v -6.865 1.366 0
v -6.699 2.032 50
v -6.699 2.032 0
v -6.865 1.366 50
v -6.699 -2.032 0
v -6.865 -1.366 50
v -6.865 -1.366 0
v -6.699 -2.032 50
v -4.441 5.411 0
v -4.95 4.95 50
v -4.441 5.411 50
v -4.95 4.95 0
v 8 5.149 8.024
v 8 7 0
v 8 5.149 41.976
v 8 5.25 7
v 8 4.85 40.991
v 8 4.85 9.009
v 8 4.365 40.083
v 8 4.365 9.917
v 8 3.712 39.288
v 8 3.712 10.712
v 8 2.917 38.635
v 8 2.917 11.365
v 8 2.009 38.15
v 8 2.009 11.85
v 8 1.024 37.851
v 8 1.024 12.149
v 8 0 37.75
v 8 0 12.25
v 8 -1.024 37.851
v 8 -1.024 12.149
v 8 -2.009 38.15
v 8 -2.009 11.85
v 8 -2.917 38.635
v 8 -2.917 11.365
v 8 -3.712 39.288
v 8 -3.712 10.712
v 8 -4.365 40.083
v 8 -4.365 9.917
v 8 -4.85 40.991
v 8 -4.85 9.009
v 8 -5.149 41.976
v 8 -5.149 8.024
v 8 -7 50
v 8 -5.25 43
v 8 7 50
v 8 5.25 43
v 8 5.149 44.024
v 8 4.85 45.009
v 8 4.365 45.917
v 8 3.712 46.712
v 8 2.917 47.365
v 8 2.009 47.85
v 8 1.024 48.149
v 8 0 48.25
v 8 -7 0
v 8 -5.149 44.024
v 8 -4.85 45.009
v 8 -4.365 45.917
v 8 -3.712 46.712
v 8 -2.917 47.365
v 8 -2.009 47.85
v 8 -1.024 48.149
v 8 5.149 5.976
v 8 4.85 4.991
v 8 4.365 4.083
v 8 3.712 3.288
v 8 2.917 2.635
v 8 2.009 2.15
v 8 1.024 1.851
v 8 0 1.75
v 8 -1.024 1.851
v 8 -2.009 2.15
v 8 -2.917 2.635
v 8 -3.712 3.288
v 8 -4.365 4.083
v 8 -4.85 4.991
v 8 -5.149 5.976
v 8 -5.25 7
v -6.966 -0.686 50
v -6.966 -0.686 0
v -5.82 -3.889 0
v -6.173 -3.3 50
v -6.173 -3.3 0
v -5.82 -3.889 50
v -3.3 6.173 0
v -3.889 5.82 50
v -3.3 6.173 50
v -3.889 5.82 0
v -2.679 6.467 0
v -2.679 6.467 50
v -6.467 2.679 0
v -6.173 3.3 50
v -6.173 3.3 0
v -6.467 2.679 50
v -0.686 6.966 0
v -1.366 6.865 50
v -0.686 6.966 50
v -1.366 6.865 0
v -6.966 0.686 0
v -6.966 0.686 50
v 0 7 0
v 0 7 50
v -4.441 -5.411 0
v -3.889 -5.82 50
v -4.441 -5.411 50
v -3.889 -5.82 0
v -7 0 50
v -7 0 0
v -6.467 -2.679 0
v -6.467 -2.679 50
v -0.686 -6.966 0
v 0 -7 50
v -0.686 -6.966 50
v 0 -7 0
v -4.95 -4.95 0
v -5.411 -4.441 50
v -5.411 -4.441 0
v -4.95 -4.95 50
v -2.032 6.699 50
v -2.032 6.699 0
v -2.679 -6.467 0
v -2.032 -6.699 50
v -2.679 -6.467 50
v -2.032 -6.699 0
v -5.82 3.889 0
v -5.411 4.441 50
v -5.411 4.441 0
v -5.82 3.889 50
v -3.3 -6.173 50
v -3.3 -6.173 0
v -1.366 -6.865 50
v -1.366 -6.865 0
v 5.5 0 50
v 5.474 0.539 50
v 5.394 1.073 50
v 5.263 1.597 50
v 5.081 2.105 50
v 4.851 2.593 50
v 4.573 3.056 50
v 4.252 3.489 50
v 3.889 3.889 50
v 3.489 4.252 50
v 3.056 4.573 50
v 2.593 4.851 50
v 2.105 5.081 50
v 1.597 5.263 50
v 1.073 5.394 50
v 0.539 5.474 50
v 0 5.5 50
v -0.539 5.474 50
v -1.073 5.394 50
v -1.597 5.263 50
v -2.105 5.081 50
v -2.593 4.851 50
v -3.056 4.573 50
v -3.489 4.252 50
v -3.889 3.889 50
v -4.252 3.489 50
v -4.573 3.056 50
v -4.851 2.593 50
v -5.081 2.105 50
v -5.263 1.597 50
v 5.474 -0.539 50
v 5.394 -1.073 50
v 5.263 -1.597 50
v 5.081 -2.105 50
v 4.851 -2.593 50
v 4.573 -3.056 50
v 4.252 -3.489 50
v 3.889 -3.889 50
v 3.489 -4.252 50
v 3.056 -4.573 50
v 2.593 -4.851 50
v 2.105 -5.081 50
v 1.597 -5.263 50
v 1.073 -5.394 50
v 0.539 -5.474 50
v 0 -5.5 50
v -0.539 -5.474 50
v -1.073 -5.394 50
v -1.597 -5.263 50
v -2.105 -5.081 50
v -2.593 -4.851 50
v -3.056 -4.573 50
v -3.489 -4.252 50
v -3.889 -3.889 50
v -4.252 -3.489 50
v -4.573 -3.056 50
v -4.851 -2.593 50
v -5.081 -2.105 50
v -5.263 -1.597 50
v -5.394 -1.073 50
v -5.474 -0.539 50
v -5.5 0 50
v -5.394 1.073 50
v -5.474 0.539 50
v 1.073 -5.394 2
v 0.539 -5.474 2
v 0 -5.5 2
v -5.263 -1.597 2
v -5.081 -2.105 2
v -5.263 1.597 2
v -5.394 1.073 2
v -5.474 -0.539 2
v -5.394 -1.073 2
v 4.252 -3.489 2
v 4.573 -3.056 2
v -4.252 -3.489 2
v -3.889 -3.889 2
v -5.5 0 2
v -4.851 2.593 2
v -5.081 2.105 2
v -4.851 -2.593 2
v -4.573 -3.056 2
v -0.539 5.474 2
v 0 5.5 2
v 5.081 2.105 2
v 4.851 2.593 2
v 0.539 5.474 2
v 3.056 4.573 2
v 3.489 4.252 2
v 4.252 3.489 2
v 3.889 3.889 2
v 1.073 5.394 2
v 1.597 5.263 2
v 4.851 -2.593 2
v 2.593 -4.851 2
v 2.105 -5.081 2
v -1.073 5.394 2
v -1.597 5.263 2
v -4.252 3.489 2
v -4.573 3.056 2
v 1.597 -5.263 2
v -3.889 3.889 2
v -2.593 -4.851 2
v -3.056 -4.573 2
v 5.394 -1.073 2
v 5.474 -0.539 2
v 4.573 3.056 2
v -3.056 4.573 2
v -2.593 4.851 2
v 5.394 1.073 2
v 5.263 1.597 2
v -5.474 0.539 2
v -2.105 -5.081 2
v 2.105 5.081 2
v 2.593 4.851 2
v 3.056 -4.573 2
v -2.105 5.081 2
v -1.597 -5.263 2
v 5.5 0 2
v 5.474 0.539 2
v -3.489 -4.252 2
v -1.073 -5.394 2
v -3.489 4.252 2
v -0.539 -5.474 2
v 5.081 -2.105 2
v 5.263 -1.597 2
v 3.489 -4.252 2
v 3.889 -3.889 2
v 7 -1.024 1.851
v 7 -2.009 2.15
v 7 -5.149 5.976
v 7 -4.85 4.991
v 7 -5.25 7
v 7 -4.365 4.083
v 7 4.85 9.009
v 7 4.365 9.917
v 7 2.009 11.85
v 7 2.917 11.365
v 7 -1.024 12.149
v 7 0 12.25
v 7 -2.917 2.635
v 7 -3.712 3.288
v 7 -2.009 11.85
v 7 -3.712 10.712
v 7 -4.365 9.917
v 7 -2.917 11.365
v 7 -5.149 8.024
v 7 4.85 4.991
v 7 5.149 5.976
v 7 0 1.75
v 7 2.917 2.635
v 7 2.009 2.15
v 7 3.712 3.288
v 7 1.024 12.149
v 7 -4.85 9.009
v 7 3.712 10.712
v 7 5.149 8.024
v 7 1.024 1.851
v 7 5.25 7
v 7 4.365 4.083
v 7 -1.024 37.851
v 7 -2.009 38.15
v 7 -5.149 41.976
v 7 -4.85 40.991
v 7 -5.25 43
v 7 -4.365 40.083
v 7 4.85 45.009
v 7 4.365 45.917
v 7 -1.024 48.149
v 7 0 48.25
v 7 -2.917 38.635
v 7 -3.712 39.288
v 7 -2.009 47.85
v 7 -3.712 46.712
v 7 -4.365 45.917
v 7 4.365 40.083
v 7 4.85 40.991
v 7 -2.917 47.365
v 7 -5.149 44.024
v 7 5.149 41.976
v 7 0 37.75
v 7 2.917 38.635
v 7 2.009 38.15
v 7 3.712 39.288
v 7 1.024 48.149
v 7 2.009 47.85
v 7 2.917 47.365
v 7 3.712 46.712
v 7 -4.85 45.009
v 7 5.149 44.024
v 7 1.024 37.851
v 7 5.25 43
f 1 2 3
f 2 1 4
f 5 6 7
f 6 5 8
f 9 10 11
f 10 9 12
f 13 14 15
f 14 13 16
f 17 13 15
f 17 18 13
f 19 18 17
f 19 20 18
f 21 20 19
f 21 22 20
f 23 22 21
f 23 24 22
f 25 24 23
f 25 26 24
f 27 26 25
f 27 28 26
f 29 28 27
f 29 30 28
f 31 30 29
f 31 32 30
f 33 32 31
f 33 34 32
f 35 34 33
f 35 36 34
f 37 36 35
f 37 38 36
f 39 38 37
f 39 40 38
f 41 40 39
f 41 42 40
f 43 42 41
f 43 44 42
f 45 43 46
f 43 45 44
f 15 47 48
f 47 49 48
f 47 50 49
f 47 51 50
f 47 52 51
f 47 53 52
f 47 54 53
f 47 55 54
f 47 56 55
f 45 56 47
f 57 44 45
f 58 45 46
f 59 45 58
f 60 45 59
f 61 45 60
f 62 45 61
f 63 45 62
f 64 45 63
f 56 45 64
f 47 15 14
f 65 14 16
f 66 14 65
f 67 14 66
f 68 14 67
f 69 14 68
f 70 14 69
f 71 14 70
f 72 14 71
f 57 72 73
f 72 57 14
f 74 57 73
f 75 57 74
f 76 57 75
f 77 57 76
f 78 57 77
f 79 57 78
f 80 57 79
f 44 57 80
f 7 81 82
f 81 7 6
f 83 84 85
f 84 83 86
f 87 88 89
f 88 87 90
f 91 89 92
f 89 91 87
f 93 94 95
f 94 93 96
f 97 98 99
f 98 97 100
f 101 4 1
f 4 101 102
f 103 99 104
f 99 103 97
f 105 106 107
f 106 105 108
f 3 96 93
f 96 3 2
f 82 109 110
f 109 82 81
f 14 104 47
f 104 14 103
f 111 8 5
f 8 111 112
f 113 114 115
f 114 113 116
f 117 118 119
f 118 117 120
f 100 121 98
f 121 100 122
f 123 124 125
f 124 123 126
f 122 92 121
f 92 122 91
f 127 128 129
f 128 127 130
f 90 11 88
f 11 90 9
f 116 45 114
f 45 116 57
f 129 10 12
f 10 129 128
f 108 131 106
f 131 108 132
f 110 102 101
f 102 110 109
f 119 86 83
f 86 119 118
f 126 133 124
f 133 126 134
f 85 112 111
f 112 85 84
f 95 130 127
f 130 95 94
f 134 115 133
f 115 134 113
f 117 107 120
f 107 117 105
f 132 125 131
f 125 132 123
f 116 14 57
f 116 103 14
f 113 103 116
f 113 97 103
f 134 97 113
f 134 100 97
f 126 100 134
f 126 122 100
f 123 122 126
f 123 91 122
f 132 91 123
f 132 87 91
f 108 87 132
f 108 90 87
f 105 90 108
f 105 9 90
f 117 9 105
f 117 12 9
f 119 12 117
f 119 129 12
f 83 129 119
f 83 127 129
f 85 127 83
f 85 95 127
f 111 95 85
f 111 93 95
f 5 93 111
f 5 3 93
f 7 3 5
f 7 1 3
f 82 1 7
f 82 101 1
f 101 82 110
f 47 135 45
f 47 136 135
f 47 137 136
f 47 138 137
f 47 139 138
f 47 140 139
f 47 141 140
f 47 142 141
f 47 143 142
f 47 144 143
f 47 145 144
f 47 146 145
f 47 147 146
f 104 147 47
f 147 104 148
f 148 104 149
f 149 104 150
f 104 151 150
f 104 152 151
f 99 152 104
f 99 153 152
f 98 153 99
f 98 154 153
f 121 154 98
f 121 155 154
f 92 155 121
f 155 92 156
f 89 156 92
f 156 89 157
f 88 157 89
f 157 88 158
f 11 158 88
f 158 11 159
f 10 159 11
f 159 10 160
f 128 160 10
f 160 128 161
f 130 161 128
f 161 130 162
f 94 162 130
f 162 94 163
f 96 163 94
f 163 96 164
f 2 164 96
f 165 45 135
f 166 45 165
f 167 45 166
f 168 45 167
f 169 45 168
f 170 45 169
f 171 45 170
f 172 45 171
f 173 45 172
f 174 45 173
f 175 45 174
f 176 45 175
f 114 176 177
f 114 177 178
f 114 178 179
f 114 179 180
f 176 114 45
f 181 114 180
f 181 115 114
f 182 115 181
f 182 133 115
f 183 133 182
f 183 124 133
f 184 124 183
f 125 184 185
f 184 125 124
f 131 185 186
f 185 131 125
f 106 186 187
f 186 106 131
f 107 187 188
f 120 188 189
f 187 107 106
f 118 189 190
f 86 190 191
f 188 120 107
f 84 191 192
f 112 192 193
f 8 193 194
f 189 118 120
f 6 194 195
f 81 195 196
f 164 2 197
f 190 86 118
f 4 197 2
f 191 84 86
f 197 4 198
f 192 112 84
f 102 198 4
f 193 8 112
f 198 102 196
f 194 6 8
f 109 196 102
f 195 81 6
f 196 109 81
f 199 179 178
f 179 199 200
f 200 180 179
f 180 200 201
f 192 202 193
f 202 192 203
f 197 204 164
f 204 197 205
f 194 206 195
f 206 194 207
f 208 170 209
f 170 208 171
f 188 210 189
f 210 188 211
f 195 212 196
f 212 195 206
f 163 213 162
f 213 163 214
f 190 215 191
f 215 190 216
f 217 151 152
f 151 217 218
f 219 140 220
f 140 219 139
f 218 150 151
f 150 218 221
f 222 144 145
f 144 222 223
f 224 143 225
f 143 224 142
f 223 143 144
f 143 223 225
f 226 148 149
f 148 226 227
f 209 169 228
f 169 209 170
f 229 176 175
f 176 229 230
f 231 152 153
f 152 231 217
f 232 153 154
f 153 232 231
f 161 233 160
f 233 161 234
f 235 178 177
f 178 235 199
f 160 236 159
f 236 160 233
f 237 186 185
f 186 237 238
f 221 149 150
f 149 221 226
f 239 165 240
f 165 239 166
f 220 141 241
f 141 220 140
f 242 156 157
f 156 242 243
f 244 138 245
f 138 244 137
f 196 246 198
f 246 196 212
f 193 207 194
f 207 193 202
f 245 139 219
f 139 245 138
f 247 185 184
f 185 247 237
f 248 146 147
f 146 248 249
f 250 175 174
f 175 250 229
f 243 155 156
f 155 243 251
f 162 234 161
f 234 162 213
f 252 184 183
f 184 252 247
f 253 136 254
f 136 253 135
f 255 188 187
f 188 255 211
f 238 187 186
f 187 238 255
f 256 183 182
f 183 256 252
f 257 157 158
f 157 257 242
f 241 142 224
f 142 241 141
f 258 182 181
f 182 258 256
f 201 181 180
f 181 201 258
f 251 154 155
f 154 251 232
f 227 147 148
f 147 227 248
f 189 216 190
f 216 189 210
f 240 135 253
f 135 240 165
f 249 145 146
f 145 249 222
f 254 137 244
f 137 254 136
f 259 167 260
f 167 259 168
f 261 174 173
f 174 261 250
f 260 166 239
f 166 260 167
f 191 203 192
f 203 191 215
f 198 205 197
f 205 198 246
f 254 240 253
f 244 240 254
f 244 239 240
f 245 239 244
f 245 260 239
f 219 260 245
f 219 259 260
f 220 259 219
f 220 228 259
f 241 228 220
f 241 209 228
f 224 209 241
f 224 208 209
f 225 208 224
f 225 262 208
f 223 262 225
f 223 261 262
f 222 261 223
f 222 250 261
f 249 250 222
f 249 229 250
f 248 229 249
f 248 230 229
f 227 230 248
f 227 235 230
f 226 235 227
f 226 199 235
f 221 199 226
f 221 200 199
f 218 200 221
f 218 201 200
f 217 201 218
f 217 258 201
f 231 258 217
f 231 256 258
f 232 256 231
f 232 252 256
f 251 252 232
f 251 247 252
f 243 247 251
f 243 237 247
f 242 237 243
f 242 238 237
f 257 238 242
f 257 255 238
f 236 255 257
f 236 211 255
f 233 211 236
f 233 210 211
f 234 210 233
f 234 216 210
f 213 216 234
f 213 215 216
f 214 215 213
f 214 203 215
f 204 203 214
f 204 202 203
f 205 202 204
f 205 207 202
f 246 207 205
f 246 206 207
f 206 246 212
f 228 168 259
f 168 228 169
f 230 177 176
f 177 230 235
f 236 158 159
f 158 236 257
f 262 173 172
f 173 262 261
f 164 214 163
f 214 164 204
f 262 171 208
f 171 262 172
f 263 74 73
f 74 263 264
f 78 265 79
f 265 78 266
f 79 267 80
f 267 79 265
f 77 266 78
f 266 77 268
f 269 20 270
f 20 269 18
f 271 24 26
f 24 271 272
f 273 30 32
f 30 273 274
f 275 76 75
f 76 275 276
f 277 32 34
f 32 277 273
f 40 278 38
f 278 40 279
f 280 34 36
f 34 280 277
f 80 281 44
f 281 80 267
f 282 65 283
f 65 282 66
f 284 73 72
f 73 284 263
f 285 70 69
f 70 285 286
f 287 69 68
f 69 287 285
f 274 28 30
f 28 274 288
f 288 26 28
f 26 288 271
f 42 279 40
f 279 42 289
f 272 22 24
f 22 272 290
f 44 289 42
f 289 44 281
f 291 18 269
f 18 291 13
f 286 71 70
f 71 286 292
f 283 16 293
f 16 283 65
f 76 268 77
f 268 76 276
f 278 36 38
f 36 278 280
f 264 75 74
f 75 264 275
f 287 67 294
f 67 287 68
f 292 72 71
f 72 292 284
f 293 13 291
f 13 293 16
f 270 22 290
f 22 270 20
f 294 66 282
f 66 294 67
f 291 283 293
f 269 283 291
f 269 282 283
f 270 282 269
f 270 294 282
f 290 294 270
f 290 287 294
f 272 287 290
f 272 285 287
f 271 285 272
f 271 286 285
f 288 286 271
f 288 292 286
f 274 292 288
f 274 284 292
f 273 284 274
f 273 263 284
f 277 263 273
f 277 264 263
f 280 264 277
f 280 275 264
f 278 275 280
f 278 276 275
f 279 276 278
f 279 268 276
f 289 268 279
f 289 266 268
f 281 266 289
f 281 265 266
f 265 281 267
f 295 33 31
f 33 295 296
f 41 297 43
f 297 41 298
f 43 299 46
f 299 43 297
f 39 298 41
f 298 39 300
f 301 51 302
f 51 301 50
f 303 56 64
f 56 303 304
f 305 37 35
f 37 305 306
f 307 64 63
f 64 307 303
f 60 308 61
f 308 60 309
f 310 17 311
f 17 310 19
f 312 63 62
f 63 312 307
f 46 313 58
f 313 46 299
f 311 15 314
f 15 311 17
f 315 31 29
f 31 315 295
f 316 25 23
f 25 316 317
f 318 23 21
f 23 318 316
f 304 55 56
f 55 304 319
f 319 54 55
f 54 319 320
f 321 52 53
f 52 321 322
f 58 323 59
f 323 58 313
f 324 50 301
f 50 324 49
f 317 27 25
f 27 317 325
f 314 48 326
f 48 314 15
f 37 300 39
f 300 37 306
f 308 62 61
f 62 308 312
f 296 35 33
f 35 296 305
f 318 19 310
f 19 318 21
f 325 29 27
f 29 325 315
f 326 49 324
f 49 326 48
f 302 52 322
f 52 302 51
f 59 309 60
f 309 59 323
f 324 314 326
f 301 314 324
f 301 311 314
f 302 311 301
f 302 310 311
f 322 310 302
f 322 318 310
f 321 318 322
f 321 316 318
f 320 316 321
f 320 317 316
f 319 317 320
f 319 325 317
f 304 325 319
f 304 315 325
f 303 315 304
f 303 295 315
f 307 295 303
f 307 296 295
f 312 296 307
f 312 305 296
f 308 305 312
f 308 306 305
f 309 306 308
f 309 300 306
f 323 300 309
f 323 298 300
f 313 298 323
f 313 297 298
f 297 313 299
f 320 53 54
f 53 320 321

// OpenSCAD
// [FL_INDEX: keywords="openscad, 3d_parametric, Parametric_magnetic_fridge_pen_holder, csg_solid" | COT="Parametric OpenSCAD design from 3DCodeverse"]
// Title: Parametric magnetic fridge pen holder

//All units in mm.

//Total height of the holder.
total_height=50; //[0:100]

//Diameter of the pen. 
pen_diameter=10; //[5:50]

//Diameter of the magnets. Must not be larger than the pen diameter!
magnet_diameter=10; //[1:20]

//Height of the magnets. This also changes the thickness of the back wall.
magnet_height=1; //[1:20]

//Calculate outer wall (2mm)
outer_diameter=pen_diameter+4;

rotate([0,0,-90])
difference()
{
difference()
{
linear_extrude(height=total_height,convexity=10)
union()
{
circle(r=(outer_diameter/2), $fn=64);
translate([-(outer_diameter/2),0,0])
square([outer_diameter,magnet_height+(outer_diameter/2)]);
}


translate([0,0,2])
linear_extrude(height=total_height,convexity=10)
circle(r=(pen_diameter/2)+0.5, $fn=64);
}

translate([0,outer_diameter/2,(magnet_diameter/2)+2])
rotate([-90,0,0])
cylinder(h=magnet_height+1,r=(magnet_diameter/2)+0.25,$fn=32);

translate([0,outer_diameter/2,total_height-((magnet_diameter/2)+2)])
rotate([-90,0,0])
cylinder(h=magnet_height+1,r=(magnet_diameter/2)+0.25, $fn=32);

}
